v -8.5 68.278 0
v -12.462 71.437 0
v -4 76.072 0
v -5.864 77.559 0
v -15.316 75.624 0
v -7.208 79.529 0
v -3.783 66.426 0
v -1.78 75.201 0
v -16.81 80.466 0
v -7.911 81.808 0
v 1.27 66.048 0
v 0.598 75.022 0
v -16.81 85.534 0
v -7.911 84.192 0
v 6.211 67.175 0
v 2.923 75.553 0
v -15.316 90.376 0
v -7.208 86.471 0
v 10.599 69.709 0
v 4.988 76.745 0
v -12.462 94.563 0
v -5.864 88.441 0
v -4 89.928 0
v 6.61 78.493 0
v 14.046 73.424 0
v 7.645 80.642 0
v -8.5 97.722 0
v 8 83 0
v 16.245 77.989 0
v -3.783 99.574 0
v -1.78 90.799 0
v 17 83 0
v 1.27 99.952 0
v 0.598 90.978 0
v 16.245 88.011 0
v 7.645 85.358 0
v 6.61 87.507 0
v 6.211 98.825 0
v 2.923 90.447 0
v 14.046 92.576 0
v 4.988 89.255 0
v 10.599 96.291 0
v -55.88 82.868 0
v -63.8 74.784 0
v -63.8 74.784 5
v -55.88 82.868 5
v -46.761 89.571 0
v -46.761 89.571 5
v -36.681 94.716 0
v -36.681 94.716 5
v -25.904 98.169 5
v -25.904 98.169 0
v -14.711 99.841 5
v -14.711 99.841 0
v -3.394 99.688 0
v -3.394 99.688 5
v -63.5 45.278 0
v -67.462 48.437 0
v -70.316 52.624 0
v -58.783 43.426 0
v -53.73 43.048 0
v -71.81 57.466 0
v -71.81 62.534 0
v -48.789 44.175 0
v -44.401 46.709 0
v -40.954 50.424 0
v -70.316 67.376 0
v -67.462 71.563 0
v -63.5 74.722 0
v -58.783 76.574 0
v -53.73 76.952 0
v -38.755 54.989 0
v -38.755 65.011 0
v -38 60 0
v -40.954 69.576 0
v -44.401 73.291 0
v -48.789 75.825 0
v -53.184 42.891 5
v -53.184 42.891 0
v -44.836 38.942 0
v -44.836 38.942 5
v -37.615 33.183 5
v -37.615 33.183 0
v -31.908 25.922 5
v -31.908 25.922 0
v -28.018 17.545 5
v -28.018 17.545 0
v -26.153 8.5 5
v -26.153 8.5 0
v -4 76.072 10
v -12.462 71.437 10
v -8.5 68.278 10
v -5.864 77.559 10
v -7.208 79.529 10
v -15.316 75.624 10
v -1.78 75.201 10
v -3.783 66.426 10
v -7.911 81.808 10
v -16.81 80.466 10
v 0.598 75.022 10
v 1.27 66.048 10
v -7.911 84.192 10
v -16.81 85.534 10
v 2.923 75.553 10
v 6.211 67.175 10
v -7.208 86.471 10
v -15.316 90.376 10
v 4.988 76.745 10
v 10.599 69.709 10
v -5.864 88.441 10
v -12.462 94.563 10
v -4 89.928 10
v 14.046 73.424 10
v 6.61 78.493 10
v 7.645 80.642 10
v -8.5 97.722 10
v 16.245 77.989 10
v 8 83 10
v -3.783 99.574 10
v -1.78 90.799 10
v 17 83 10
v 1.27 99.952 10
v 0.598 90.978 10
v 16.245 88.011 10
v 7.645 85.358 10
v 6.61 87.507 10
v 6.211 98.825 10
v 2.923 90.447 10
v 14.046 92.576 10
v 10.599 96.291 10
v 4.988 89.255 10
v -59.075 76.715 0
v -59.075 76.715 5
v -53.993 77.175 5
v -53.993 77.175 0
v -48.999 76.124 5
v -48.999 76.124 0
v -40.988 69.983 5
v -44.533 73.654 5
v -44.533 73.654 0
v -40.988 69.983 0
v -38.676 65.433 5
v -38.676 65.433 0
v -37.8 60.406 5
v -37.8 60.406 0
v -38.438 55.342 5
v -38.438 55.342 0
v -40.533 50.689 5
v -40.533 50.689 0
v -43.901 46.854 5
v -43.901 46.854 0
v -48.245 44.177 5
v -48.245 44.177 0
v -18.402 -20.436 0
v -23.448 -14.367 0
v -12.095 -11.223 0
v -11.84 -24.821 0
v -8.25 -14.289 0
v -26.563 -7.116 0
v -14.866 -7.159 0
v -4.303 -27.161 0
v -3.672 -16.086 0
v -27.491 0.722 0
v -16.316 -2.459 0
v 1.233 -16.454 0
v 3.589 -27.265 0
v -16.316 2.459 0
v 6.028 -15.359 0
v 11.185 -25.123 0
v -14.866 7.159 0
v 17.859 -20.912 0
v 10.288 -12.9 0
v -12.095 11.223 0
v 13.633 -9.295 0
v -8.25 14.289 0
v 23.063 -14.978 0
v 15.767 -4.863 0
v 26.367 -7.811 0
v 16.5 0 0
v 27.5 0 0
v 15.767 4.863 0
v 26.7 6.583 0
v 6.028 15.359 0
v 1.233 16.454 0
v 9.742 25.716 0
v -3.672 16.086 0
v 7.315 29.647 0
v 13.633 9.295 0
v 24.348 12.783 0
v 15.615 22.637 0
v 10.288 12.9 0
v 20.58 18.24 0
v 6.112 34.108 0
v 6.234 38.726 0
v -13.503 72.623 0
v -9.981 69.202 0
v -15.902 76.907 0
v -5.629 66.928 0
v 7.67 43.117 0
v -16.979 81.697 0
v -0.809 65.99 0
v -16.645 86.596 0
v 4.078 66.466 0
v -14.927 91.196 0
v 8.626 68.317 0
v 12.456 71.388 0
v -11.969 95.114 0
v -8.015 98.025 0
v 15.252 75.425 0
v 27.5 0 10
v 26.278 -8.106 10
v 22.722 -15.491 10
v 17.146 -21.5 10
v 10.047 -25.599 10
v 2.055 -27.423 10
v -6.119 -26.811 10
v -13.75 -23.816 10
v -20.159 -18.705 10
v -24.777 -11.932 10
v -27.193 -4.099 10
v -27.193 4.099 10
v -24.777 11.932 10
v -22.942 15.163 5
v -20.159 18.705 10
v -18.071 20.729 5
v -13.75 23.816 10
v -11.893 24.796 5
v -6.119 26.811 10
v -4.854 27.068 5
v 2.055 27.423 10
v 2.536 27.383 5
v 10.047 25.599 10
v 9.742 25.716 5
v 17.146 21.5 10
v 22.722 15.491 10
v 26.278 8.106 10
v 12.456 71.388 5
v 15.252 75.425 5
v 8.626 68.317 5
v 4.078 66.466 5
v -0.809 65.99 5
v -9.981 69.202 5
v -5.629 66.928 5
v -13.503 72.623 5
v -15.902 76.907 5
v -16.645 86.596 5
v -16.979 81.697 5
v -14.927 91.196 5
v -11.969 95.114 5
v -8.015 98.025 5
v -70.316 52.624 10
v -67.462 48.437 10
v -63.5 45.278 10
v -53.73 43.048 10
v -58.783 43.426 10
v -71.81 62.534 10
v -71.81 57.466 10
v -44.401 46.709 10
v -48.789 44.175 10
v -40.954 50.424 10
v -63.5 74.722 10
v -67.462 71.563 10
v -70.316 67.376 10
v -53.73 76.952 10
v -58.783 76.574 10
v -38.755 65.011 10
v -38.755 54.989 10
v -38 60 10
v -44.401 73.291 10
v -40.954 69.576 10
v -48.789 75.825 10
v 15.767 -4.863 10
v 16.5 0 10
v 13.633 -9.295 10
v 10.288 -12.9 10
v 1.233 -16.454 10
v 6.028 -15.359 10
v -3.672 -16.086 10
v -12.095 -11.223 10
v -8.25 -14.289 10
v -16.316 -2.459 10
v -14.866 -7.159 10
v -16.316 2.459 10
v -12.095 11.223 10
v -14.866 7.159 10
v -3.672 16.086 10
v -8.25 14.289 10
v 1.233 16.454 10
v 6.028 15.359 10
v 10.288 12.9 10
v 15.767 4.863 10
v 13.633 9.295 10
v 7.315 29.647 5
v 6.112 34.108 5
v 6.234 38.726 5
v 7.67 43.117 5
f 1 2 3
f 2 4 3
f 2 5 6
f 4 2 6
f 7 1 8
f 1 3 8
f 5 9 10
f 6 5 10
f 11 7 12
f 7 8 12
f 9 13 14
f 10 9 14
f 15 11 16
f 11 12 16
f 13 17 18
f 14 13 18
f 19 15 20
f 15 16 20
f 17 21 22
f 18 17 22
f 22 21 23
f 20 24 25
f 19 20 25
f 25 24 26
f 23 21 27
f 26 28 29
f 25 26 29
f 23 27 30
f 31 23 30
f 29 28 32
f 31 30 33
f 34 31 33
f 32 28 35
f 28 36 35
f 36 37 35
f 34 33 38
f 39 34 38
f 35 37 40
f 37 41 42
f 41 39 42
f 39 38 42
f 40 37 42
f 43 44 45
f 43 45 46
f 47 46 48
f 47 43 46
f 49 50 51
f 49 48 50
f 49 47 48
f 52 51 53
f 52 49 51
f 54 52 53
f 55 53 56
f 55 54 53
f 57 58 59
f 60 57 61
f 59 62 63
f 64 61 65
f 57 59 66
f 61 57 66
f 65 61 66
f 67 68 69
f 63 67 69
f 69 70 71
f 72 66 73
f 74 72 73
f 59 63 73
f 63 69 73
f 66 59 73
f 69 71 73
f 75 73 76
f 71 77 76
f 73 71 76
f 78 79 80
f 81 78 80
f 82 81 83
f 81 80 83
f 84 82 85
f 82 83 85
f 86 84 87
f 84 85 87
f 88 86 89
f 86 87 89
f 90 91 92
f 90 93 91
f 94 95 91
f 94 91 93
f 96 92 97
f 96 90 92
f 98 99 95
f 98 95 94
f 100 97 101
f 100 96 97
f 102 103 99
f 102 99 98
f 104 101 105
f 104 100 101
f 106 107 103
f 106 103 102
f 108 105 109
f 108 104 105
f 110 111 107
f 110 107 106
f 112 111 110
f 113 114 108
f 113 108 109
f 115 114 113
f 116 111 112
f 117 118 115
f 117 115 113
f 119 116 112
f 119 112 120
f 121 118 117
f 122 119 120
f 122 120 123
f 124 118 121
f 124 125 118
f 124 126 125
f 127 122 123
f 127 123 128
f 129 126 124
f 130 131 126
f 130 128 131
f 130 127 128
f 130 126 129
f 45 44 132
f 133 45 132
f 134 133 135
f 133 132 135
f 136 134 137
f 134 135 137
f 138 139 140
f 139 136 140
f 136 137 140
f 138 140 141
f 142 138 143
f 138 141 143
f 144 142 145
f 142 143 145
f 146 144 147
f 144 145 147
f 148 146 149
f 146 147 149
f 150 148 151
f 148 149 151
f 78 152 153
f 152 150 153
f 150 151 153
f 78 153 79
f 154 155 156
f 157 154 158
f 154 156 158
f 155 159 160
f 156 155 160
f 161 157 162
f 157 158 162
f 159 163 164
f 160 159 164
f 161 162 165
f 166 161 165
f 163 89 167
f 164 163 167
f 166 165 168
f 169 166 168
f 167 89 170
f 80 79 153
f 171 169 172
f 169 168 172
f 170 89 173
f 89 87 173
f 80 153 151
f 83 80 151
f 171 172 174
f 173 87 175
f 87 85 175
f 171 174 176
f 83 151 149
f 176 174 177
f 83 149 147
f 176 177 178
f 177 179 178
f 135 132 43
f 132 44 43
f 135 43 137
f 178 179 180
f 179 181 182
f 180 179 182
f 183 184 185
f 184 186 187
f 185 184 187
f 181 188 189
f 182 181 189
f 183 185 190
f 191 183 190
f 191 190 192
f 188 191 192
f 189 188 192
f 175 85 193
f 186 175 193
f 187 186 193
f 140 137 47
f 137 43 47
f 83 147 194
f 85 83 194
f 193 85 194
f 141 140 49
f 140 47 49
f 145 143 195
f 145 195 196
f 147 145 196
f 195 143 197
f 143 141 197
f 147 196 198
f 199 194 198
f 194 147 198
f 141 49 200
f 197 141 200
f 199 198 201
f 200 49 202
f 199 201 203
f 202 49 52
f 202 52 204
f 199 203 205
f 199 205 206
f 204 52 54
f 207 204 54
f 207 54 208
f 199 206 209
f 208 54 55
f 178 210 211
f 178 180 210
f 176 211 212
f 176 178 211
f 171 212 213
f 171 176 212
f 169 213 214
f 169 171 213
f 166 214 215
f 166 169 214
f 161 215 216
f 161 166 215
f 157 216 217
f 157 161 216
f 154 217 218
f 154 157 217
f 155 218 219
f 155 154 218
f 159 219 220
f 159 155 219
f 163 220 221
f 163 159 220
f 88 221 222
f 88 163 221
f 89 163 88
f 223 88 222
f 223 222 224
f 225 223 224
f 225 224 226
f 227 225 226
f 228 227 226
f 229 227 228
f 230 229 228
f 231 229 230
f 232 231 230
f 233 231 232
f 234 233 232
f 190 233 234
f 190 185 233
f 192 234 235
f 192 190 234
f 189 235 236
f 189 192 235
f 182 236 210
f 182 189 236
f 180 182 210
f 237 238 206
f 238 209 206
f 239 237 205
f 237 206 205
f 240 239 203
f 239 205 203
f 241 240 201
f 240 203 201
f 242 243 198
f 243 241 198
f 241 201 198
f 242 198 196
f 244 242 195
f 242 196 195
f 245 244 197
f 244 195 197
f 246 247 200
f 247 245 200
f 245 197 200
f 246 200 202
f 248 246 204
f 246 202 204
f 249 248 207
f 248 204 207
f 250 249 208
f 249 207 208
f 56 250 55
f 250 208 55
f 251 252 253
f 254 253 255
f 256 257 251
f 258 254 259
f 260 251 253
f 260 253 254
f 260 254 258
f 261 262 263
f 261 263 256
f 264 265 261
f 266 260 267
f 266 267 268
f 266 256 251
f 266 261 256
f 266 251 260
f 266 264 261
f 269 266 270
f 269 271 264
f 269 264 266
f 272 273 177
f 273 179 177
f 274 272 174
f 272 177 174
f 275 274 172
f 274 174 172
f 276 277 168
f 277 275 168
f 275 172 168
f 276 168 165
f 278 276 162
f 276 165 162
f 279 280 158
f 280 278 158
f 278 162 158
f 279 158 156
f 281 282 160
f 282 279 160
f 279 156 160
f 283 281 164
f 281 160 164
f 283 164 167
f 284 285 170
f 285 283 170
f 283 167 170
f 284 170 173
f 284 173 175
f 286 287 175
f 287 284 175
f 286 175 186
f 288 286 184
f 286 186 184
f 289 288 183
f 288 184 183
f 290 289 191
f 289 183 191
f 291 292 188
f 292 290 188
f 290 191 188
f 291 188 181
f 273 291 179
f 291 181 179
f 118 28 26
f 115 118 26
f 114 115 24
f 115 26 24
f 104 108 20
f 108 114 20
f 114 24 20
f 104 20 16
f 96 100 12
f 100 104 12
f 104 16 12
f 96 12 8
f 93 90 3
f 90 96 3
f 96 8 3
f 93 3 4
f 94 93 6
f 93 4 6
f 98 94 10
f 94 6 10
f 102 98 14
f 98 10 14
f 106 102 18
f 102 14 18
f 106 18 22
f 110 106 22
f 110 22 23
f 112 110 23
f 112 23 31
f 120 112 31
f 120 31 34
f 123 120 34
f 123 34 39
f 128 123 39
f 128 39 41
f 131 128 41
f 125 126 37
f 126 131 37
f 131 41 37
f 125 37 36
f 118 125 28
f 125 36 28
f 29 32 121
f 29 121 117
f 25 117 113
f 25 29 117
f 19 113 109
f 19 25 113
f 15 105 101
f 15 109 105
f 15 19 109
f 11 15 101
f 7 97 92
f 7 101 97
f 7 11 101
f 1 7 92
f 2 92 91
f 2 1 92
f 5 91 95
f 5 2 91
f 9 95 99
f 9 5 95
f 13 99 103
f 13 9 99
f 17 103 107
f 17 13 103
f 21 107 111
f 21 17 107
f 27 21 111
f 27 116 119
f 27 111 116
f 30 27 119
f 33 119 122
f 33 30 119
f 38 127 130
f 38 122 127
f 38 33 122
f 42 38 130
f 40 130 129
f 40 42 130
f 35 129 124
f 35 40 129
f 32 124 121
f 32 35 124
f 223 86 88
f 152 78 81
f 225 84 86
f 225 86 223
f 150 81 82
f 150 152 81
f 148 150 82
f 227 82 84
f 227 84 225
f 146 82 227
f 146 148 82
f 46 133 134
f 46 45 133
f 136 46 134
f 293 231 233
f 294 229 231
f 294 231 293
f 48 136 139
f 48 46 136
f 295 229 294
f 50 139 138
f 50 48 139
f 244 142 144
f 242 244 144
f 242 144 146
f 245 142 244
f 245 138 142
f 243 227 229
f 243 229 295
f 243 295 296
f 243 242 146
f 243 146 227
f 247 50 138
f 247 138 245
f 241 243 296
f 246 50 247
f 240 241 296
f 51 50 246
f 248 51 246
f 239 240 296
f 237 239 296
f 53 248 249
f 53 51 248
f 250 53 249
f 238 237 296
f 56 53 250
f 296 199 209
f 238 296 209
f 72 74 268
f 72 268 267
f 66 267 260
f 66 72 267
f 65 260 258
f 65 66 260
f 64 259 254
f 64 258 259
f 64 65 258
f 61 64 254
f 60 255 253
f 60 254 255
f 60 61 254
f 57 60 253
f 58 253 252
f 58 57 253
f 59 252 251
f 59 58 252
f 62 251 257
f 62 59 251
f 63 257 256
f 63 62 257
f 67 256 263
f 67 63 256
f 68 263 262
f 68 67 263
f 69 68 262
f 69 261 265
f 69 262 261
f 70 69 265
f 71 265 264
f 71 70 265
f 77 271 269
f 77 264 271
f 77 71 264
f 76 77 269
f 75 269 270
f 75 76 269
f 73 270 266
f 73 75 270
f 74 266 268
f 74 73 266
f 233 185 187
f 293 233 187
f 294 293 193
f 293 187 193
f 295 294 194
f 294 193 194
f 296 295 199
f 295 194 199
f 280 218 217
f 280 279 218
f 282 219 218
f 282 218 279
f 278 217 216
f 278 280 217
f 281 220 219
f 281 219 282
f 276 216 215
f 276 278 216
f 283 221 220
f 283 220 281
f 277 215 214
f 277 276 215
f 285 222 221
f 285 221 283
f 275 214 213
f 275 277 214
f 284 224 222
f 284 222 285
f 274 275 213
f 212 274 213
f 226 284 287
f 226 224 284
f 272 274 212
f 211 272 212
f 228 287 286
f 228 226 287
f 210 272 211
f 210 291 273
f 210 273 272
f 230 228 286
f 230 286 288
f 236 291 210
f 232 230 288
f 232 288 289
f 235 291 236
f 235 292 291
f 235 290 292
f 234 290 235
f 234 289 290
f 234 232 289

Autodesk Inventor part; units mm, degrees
ref_plane "YZ Plane" through (0, 0, 0) normal (1, 0, 0) x (0, 1, 0)
ref_plane "XZ Plane" through (0, 0, 0) normal (0, 1, 0) x (-1, 0, 0)
ref_plane "XY Plane" through (0, 0, 0) normal (0, 0, 1) x (1, 0, 0)
sketch "Sketch1" plane through (0, 0, 0) normal (0, 0, 1) x (1, 0, 0)
  circle A0 centre (0, 0) radius 27.5
  circle A1 centre (0, 0) radius 16.5
  circle A2 centre (-55, 60) radius 17
  circle A3 centre (0, 83) radius 17
  circle A4 centre (0, 83) radius 8
  dimension "d0" = 55
  dimension "d1" = 33
  dimension "d2" = 34
  dimension "d3" = 34
  dimension "d4" = 16
sketch "Sketch2" plane through (0, 0, 0) normal (0, 0, 1) x (1, 0, 0)
  arc A0 (-3.3945, 99.6876) -> (-63.7995, 74.7841) centre (-10, 30) ccw
  arc A1 (-53.1844, 42.8914) -> (-63.7995, 74.7841) centre (-55, 60) ccw
  arc A2 (-3.3945, 99.6876) -> (15.2517, 75.4247) centre (0, 83) ccw
  arc A3 (10.2232, 25.1691) -> (-26.084, 7.5911) centre (0, 0) ccw
  arc A4 (-26.084, 7.5911) -> (-53.1844, 42.8914) centre (-66, 5) ccw
  arc A5 (7.6702, 43.1174) -> (10.2232, 25.1691) centre (22, 36) ccw
  line L0 (7.6702, 43.1174) -> (15.2517, 75.4247)
  dimension "d8" = 140
  dimension "d9" = 80
  dimension "d10" = 32
extrude "Extrusion1" add sketch "Sketch1" along normal blind 10
extrude "Extrusion2" add sketch "Sketch2" along normal blind 5
properties part number "Desafio 2 - MASA - Inventor"
